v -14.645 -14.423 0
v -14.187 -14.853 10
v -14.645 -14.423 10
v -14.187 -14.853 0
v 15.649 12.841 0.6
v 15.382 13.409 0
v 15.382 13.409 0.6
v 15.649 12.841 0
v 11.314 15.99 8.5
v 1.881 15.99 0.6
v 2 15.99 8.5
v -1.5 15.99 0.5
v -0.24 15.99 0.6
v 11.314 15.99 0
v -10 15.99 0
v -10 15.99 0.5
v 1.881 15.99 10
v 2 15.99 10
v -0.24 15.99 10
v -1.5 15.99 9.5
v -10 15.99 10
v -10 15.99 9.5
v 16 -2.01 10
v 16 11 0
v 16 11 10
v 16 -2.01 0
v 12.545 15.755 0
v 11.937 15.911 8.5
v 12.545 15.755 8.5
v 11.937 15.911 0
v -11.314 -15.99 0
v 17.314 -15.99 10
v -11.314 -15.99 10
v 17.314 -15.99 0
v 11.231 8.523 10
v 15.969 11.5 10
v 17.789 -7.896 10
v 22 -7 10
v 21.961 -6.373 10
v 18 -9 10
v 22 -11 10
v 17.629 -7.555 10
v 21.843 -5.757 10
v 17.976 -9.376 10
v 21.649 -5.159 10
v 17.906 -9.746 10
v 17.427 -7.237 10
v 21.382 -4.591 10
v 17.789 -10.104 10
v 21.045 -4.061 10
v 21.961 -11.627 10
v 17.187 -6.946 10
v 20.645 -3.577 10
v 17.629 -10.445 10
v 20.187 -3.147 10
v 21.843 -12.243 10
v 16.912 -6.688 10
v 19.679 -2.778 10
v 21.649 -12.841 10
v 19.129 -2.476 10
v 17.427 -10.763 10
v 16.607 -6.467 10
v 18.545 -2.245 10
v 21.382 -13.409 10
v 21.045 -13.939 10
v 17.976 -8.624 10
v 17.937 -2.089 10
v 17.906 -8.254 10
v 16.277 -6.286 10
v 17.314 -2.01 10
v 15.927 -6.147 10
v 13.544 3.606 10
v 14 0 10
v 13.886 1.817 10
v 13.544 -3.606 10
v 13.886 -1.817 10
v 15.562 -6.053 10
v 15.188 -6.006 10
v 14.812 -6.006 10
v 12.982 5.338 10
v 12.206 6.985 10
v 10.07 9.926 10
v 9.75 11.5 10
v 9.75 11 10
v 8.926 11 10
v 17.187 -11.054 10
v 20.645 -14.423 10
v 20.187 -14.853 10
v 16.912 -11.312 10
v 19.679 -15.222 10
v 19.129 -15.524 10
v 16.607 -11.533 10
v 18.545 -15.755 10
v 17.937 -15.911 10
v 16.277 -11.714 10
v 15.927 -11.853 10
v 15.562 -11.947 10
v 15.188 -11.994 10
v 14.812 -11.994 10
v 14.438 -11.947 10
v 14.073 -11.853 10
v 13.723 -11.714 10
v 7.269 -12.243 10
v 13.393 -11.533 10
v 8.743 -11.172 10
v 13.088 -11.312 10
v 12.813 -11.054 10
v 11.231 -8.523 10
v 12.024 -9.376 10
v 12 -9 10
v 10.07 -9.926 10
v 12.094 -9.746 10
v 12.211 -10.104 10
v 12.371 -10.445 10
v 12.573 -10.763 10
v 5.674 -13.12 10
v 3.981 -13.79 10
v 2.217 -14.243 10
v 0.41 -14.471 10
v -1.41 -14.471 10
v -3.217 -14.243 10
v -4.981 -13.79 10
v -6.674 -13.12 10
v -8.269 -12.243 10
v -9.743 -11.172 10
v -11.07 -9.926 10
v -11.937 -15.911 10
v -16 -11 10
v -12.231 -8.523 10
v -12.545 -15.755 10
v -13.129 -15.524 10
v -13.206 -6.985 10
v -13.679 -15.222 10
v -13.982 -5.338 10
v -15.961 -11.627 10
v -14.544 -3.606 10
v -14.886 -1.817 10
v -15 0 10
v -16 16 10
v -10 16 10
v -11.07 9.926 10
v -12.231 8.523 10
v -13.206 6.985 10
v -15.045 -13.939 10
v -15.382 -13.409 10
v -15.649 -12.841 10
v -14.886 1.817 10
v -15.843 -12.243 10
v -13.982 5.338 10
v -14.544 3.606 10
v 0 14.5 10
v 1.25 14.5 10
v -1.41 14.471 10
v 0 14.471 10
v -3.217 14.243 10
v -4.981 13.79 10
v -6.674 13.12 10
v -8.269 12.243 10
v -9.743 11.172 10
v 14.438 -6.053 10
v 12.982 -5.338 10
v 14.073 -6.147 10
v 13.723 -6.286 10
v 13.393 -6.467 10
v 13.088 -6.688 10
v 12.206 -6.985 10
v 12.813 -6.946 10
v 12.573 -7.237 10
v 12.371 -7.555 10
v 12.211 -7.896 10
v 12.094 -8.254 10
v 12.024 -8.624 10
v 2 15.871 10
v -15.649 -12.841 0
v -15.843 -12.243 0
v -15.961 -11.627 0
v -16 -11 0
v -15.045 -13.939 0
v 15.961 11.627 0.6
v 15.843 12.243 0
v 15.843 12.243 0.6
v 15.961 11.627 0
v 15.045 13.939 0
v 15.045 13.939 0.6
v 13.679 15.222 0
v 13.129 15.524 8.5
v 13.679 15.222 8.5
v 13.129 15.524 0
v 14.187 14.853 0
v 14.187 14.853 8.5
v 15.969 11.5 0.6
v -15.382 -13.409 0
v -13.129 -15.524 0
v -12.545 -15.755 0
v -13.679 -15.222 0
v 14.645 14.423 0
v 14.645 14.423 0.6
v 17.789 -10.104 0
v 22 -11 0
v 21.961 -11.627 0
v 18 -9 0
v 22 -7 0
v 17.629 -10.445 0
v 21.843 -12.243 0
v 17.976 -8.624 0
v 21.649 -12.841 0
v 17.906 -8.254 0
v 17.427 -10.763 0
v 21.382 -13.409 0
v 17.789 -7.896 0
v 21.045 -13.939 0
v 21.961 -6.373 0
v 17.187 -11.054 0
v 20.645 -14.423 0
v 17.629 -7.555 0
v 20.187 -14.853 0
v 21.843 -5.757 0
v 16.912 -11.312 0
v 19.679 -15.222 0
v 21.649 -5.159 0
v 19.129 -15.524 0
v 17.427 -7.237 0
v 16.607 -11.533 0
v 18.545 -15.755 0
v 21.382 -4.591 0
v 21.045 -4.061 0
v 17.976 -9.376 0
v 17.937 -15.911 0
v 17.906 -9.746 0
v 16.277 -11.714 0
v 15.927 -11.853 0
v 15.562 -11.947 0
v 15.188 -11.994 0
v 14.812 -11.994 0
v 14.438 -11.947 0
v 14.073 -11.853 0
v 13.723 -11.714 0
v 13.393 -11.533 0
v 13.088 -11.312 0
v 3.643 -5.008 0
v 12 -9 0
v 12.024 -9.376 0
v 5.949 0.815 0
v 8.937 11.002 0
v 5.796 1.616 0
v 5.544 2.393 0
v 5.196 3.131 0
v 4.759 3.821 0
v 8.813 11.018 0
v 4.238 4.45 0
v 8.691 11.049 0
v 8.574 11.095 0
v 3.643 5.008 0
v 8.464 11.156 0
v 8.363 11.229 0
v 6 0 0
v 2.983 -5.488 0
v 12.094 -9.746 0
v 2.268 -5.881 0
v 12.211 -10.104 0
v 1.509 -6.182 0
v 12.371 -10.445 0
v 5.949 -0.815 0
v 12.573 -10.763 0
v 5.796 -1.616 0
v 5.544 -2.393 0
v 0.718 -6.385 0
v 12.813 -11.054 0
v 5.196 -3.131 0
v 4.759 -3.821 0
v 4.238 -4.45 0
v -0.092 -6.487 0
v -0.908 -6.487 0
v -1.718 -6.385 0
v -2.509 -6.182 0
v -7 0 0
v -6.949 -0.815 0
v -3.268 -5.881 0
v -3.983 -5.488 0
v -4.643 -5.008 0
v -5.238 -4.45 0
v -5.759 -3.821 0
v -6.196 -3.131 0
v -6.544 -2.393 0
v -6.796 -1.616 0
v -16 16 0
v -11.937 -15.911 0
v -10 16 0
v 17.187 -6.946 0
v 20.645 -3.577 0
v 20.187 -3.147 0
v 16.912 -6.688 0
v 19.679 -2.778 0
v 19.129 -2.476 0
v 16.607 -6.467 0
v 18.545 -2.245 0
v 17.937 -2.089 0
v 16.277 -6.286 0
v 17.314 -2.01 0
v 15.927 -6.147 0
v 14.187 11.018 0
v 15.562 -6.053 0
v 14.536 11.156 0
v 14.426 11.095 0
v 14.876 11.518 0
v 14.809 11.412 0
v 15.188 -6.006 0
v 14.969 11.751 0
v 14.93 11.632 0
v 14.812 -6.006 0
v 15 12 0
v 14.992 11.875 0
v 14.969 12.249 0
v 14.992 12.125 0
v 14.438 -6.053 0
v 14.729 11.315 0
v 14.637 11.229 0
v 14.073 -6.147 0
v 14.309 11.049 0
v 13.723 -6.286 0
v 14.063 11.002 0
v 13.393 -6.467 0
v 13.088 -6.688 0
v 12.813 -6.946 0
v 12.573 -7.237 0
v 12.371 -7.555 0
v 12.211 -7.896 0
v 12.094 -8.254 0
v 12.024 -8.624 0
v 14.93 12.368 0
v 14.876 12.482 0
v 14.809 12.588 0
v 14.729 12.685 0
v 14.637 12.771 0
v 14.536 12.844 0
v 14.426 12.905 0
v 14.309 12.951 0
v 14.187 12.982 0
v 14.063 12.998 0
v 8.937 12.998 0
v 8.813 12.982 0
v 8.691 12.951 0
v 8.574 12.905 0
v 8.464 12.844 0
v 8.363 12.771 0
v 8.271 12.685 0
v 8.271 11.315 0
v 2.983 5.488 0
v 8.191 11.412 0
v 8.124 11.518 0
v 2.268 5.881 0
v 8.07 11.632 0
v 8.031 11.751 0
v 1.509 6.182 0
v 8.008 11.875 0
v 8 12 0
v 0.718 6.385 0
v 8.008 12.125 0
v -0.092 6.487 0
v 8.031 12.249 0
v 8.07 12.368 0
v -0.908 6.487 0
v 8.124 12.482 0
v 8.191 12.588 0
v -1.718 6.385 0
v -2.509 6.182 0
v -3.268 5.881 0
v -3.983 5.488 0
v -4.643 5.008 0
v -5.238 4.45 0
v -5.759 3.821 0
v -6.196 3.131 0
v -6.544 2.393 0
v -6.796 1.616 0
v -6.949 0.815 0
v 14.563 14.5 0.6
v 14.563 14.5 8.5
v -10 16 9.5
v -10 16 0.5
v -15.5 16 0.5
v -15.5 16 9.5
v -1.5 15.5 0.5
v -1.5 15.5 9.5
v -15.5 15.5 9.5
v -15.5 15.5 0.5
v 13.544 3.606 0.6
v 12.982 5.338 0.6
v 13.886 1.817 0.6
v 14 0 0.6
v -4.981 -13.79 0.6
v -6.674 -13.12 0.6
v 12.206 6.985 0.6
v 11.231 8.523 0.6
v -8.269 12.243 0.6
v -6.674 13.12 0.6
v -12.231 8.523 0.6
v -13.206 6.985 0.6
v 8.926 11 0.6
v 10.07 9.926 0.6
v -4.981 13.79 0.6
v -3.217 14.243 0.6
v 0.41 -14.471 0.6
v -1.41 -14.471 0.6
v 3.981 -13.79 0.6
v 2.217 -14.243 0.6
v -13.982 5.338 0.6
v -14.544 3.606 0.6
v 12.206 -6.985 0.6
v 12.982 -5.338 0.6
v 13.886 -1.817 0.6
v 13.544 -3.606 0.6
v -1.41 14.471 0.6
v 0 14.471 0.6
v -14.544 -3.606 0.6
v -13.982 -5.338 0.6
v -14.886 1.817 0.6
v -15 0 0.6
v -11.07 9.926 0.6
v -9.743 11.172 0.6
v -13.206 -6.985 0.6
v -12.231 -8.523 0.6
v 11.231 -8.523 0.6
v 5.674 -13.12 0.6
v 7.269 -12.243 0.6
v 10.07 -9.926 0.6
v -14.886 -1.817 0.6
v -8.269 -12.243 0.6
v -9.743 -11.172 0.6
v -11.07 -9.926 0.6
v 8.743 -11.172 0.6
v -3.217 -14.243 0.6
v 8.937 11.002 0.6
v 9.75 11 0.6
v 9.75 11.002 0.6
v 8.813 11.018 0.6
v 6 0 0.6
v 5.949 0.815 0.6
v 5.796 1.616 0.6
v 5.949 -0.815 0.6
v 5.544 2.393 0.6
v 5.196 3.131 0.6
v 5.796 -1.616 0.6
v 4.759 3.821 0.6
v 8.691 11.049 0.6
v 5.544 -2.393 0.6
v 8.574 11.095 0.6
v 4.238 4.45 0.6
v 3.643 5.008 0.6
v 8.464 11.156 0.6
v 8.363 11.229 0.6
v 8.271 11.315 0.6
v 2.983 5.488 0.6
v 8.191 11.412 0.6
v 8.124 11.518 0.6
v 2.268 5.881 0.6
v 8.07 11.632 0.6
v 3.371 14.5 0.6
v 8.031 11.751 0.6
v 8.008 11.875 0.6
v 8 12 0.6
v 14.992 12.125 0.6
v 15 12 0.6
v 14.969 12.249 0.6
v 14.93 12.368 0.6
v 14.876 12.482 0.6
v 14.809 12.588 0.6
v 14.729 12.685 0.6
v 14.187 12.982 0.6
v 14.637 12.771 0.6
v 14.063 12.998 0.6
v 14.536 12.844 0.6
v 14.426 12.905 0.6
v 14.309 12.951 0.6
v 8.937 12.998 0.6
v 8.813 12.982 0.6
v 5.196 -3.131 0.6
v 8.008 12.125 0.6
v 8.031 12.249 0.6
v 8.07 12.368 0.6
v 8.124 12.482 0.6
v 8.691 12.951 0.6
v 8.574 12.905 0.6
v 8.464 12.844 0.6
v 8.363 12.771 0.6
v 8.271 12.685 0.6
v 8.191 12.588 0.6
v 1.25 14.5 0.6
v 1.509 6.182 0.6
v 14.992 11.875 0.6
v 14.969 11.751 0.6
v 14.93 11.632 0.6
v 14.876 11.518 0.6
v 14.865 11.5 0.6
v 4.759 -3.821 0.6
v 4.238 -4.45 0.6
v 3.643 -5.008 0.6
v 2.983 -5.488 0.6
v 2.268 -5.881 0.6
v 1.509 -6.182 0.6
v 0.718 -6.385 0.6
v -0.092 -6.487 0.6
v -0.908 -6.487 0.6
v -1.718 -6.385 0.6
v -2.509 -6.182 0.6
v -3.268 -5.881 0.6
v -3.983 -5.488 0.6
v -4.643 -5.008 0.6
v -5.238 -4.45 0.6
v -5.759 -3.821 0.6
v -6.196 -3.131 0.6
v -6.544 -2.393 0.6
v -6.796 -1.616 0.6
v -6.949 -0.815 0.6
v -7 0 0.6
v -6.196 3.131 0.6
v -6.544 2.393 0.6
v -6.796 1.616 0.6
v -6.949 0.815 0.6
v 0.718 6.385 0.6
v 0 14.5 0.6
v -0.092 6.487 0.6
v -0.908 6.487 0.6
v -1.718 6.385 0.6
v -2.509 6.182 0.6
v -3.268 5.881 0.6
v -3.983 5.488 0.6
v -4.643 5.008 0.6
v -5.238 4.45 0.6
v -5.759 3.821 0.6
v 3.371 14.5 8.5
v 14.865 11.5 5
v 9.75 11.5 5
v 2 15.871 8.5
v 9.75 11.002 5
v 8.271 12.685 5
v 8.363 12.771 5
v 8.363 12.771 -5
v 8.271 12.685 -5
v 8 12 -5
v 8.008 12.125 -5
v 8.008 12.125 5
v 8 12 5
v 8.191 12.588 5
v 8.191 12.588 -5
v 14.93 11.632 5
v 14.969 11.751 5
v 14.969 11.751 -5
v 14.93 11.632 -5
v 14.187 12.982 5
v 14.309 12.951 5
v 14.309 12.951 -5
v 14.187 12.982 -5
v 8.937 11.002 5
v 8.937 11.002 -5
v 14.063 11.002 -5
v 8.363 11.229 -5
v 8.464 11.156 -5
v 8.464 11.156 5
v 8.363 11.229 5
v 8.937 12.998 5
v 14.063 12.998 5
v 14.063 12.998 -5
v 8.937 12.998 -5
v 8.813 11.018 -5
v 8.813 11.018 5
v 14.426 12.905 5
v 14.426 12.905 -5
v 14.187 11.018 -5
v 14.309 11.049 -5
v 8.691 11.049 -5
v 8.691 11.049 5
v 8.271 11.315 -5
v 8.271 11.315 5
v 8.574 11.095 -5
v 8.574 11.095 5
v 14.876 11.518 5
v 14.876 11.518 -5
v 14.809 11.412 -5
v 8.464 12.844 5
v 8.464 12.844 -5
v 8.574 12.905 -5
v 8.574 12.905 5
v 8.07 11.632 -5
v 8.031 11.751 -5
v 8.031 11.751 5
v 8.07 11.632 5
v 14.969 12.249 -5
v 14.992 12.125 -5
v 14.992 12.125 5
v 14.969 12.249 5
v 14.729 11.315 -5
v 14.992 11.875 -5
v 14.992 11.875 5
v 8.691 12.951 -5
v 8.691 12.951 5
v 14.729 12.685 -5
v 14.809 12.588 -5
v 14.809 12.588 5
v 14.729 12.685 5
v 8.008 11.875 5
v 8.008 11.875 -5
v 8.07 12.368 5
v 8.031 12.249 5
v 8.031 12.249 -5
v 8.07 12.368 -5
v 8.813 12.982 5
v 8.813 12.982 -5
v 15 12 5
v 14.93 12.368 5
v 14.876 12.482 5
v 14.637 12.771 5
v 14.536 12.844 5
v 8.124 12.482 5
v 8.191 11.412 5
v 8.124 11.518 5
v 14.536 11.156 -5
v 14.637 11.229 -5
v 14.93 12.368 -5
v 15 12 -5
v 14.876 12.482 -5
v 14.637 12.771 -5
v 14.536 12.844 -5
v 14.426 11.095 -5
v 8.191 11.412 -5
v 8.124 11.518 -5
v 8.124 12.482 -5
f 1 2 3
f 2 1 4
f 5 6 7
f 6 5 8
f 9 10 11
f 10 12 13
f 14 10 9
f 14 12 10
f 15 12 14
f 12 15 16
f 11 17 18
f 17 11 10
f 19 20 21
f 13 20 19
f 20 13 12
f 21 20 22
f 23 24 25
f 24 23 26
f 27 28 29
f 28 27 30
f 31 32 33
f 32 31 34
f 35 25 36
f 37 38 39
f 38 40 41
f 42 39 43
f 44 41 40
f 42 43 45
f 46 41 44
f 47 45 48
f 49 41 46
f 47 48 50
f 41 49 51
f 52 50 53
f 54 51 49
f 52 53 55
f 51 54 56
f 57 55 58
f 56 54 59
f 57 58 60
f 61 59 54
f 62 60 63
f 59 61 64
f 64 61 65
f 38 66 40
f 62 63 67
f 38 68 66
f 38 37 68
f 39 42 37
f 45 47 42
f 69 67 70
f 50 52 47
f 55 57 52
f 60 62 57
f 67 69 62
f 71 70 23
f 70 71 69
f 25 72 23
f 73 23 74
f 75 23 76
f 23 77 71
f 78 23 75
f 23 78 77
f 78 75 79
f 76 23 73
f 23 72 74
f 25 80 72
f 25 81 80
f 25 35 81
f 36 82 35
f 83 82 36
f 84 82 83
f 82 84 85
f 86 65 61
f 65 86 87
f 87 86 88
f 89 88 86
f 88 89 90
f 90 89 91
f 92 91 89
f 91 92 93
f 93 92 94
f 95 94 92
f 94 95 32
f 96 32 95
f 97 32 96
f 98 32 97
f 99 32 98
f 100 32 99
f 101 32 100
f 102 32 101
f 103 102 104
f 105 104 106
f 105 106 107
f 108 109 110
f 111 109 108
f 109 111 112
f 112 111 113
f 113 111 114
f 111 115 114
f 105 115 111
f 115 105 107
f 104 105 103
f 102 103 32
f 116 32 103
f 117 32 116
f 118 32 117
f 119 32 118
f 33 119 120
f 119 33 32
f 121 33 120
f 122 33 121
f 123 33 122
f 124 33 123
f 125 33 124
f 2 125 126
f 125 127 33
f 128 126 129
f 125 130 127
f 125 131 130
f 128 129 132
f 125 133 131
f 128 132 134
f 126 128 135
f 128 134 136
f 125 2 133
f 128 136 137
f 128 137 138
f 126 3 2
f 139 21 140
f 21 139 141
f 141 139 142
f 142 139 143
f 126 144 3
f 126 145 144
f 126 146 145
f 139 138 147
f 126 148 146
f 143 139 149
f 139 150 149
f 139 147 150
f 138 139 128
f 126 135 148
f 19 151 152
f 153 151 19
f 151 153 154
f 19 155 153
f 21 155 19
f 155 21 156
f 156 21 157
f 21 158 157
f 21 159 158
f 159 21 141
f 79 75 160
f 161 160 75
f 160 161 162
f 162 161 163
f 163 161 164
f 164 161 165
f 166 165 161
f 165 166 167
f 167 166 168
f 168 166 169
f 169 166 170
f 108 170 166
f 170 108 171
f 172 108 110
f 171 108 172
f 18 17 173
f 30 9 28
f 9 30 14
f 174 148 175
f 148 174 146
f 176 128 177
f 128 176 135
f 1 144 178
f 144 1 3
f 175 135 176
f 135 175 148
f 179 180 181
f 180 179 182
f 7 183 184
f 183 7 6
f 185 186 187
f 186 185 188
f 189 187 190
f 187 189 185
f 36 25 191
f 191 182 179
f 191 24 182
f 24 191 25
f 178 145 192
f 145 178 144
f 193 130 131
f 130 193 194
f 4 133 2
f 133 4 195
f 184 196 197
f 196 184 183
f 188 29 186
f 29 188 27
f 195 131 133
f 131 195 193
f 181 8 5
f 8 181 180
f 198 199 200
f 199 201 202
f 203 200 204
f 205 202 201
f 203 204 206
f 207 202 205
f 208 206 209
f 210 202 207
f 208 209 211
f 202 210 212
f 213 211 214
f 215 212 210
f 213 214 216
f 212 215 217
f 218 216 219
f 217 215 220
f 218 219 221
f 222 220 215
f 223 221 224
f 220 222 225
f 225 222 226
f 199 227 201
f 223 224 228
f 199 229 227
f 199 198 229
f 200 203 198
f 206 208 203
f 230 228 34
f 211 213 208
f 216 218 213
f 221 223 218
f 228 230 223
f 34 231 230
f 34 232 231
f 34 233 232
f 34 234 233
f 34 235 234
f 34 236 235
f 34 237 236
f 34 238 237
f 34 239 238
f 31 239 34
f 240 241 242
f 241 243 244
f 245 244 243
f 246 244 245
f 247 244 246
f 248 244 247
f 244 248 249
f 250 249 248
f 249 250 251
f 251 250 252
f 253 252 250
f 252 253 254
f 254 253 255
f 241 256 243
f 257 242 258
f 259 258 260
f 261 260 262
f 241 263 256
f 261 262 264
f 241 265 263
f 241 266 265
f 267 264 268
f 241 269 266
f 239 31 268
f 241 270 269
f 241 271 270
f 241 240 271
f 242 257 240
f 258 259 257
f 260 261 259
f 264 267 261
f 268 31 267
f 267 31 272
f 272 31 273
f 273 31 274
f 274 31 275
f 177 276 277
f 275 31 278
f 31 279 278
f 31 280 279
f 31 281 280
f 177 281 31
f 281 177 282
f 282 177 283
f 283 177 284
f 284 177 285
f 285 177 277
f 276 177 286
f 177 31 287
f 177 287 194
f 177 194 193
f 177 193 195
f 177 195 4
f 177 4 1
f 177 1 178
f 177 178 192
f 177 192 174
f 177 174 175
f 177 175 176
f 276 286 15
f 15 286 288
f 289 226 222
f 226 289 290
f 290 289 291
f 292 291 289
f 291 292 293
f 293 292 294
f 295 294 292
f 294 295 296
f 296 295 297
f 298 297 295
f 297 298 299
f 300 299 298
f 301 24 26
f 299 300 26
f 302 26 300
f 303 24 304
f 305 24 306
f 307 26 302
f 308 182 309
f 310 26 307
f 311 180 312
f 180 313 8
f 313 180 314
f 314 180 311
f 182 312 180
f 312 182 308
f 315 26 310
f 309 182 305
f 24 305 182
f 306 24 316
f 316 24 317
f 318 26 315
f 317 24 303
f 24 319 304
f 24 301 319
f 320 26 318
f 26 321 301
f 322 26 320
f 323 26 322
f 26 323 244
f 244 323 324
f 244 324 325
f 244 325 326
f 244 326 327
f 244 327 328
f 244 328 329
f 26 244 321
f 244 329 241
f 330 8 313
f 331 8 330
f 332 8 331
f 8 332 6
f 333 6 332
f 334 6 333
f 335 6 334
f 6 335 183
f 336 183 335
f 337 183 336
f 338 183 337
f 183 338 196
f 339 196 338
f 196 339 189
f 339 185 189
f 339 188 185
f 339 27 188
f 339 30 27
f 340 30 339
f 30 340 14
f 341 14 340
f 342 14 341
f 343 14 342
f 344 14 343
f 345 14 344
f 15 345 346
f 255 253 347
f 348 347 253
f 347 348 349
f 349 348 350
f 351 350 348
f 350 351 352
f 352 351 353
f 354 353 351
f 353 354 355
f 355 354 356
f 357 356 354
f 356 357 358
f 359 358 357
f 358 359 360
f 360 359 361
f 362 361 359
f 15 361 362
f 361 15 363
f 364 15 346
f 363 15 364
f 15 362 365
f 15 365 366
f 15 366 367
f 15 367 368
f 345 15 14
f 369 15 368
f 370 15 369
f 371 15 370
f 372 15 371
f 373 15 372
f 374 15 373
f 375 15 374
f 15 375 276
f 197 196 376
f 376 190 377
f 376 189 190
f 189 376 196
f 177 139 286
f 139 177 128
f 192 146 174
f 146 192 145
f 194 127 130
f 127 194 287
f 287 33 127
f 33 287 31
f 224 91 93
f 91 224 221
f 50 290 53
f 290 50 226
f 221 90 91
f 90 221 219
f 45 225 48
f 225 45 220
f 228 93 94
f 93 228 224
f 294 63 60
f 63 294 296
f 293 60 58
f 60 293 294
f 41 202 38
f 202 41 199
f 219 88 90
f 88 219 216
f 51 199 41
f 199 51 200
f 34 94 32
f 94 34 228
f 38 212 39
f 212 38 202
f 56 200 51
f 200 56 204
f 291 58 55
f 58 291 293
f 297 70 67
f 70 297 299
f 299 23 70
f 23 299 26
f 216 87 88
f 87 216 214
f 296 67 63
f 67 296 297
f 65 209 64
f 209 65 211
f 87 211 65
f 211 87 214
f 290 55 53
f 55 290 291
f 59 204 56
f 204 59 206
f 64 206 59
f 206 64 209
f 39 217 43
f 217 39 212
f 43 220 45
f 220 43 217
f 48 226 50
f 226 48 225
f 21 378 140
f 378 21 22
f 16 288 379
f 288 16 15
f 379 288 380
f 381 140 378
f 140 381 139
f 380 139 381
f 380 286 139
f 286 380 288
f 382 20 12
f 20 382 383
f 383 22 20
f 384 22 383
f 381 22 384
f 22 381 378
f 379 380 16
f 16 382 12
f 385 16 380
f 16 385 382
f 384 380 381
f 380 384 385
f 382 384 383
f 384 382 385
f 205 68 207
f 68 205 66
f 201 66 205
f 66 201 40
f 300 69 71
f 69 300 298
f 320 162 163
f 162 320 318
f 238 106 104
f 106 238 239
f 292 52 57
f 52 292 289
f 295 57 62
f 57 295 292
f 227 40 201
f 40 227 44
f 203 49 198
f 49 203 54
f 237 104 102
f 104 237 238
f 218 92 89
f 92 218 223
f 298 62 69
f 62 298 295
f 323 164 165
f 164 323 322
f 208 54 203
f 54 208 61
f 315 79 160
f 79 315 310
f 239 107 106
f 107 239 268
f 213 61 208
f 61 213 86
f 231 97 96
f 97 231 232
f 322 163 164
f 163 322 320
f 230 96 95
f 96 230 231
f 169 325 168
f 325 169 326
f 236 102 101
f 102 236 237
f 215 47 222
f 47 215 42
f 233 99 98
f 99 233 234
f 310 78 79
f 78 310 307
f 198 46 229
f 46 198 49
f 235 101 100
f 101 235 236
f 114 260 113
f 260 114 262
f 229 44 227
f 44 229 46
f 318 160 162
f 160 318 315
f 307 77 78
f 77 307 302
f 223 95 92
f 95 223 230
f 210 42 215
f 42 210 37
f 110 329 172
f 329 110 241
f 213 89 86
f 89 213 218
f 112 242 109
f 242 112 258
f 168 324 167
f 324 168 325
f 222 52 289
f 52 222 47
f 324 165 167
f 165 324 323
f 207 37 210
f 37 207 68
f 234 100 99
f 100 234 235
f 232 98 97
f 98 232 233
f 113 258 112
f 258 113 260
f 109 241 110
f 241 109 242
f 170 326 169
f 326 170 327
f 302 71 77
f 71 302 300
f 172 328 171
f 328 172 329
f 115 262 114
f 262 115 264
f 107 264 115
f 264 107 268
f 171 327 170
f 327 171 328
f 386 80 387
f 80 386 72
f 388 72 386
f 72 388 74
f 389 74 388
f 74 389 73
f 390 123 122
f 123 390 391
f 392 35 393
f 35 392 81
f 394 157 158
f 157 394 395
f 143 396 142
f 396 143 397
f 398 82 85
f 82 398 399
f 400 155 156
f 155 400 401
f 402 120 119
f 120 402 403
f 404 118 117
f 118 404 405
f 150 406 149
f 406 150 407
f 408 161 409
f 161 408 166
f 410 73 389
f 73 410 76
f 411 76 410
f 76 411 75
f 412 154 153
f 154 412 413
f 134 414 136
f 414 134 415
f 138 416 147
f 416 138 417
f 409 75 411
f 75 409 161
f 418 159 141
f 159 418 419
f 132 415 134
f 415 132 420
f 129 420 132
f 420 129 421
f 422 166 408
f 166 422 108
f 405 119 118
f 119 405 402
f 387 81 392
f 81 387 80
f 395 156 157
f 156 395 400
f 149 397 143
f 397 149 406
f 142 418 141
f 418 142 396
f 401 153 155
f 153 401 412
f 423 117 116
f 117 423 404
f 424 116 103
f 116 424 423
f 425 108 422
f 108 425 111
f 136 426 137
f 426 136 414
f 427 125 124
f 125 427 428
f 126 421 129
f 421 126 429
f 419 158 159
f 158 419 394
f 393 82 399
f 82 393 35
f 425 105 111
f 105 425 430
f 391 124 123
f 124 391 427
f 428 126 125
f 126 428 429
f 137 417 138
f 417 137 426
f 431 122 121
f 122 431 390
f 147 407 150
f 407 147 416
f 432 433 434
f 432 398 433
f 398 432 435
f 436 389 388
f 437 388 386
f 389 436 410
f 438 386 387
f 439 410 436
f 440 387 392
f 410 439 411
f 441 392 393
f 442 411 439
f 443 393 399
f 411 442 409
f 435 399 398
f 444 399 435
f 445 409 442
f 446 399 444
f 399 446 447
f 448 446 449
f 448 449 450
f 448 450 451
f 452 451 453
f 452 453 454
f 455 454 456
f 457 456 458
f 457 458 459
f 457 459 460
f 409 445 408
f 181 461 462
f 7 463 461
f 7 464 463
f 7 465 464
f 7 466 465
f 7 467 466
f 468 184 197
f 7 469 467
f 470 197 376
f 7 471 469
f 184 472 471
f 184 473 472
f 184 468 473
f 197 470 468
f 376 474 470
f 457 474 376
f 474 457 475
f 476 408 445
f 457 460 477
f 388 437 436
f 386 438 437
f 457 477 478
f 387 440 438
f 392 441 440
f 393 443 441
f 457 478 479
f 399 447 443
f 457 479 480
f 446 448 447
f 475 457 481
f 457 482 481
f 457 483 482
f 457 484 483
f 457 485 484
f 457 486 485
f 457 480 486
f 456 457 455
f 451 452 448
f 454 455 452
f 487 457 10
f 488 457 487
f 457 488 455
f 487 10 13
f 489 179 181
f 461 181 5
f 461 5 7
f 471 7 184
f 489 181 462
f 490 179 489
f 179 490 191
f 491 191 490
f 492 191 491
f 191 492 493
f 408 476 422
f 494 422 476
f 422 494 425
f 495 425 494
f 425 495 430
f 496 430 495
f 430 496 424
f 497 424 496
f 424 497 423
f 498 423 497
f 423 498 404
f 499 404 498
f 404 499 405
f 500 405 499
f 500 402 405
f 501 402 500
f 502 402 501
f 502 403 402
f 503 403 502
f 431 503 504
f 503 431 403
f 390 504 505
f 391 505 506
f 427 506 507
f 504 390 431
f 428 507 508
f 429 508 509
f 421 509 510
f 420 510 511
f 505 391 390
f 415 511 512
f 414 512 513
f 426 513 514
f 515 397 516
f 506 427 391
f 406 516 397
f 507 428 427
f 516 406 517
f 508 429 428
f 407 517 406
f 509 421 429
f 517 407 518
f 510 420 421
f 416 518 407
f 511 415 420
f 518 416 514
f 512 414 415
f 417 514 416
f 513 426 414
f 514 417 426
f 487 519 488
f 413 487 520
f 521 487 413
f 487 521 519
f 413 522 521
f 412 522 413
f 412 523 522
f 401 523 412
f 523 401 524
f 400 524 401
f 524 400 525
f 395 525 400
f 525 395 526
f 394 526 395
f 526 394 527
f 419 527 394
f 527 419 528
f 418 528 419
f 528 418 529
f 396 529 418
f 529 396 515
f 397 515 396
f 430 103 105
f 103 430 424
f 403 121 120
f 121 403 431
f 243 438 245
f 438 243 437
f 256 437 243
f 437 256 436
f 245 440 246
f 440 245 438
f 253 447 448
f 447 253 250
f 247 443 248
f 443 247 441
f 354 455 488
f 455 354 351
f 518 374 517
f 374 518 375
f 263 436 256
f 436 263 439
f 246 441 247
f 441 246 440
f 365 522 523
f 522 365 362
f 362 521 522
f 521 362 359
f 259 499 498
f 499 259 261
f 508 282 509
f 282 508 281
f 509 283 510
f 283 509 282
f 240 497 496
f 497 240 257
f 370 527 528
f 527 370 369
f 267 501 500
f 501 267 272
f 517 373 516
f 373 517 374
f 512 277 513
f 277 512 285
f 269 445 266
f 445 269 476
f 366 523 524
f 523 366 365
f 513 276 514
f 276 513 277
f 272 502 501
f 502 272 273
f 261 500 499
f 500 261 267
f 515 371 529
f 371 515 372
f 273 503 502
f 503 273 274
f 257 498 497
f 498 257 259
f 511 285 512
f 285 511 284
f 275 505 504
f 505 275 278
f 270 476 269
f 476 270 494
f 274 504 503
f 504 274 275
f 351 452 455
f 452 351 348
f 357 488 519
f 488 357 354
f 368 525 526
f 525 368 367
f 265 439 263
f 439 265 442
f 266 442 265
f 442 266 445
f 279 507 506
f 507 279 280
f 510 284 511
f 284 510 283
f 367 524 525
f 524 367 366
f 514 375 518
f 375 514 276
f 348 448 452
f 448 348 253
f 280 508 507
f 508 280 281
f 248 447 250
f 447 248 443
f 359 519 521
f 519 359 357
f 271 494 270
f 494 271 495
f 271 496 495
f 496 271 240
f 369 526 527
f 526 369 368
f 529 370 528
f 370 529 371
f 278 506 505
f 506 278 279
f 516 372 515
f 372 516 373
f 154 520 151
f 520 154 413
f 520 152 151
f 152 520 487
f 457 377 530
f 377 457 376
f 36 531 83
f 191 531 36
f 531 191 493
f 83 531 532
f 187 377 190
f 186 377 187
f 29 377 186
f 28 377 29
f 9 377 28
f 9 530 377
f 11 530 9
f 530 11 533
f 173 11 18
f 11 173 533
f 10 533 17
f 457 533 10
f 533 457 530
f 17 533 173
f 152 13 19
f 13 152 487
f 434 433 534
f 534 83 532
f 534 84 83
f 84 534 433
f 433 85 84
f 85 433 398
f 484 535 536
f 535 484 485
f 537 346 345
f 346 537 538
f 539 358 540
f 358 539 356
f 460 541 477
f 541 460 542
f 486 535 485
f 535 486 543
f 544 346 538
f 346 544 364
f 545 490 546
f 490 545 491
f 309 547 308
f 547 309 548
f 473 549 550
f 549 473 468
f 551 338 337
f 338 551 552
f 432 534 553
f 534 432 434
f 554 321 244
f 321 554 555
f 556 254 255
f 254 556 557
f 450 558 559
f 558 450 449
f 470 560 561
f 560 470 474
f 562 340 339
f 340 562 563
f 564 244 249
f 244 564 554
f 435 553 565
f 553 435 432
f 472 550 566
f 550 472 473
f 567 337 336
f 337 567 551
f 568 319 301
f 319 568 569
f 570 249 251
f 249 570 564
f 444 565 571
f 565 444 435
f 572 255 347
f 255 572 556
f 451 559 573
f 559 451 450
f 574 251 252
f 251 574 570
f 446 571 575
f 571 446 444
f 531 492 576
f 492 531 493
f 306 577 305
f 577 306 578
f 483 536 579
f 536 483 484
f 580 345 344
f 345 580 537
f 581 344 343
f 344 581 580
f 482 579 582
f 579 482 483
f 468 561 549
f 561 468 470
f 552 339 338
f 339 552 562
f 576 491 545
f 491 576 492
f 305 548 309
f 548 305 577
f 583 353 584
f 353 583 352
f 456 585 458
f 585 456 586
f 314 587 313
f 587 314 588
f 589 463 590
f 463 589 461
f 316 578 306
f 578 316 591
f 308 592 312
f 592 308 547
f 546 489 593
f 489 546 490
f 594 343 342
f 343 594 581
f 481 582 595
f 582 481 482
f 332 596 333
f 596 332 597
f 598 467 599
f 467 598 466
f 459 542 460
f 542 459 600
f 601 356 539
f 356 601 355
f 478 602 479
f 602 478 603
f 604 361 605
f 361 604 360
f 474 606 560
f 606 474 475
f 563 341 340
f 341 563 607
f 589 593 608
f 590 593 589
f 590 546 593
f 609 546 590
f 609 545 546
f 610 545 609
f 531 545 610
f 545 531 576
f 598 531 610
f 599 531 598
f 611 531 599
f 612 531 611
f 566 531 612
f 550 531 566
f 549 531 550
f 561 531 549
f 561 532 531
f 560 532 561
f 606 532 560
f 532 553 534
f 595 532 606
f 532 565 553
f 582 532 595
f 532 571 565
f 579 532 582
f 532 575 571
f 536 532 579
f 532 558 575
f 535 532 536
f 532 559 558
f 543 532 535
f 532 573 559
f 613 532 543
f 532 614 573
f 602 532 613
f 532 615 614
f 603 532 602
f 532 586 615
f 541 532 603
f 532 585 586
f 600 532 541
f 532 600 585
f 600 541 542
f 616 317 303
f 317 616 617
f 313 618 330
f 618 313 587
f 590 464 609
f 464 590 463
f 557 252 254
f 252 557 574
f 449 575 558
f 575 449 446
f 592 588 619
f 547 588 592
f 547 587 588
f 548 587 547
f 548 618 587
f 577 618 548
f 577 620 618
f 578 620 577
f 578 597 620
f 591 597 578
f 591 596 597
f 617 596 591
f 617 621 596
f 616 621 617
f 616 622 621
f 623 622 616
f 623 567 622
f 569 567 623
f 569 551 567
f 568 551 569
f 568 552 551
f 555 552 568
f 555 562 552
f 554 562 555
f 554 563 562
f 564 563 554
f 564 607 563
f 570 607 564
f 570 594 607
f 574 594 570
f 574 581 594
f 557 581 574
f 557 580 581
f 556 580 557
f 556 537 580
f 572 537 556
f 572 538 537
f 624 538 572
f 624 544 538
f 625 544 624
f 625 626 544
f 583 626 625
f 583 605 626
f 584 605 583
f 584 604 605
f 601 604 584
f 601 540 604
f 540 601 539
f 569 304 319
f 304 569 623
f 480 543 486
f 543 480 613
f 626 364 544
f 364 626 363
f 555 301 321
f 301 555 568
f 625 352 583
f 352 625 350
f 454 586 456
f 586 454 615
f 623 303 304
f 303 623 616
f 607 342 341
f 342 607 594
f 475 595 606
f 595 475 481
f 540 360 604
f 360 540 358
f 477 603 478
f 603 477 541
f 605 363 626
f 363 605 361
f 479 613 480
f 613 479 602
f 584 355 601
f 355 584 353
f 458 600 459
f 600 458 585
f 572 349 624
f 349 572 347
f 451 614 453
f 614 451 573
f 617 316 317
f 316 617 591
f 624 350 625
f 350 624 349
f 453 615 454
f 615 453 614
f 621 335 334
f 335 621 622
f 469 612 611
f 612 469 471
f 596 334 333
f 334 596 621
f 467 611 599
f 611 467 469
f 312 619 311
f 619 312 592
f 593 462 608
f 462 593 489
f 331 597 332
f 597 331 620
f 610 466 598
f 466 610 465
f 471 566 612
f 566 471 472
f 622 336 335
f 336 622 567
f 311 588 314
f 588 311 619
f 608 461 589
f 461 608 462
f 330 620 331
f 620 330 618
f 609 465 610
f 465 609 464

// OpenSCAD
$fn = 50;


union() {
	difference() {
		union() {
			hull() {
				translate(v = [-11.0000000000, 11.0000000000, 0]) {
					cylinder(h = 10, r = 5);
				}
				translate(v = [11.0000000000, 11.0000000000, 0]) {
					cylinder(h = 10, r = 5);
				}
				translate(v = [-11.0000000000, -11.0000000000, 0]) {
					cylinder(h = 10, r = 5);
				}
				translate(v = [11.0000000000, -11.0000000000, 0]) {
					cylinder(h = 10, r = 5);
				}
			}
			translate(v = [7.5000000000, -9.0000000000, 0]) {
				hull() {
					translate(v = [-9.5000000000, 2.0000000000, 0]) {
						cylinder(h = 10, r = 5);
					}
					translate(v = [9.5000000000, 2.0000000000, 0]) {
						cylinder(h = 10, r = 5);
					}
					translate(v = [-9.5000000000, -2.0000000000, 0]) {
						cylinder(h = 10, r = 5);
					}
					translate(v = [9.5000000000, -2.0000000000, 0]) {
						cylinder(h = 10, r = 5);
					}
				}
			}
			translate(v = [-16.0000000000, 10.0000000000, 0]) {
				cube(size = [6, 6, 10]);
			}
		}
		union() {
			translate(v = [-15.5000000000, 15.5000000000, 0.5000000000]) {
				cube(size = [14, 0.5000000000, 9.0000000000]);
			}
			translate(v = [15.0000000000, -9.0000000000, -100.0000000000]) {
				cylinder(h = 200, r = 3.0000000000);
			}
			translate(v = [-0.5000000000, 0.0000000000, 0.6000000000]) {
				cylinder(h = 12.4000000000, r = 14.5000000000);
			}
			translate(v = [-0.5000000000, 0.0000000000, -5.0000000000]) {
				cylinder(h = 10, r = 6.5000000000);
			}
			translate(v = [0.0000000000, 11.5000000000, 0.6000000000]) {
				cube(size = [16.0000000000, 3, 12.4000000000]);
			}
			translate(v = [2.0000000000, 11.5000000000, 8.5000000000]) {
				cube(size = [14.0000000000, 6, 1.5000000000]);
			}
			translate(v = [-3.0000000000, 18.7500000000, 0.6000000000]) {
				rotate(a = [0, 0, -45]) {
					cube(size = [10, 1.5000000000, 12.4000000000]);
				}
			}
			translate(v = [2.2500000000, 11.0000000000, 0.6000000000]) {
				cube(size = [7.5000000000, 2, 9.4000000000]);
			}
		}
	}
	union() {
		translate(v = [11.5000000000, 12, -5.0000000000]) {
			rotate(a = [0, 0, 0]) {
				difference() {
					union() {
						hull() {
							translate(v = [2.5000000000, 0, 0]) {
								cylinder(h = 10, r = 1.0000000000, r1 = 1.0000000000, r2 = 1.0000000000);
							}
							translate(v = [-2.5000000000, 0, 0]) {
								cylinder(h = 10, r = 1.0000000000, r1 = 1.0000000000, r2 = 1.0000000000);
							}
						}
					}
					union();
				}
			}
		}
	}
}
